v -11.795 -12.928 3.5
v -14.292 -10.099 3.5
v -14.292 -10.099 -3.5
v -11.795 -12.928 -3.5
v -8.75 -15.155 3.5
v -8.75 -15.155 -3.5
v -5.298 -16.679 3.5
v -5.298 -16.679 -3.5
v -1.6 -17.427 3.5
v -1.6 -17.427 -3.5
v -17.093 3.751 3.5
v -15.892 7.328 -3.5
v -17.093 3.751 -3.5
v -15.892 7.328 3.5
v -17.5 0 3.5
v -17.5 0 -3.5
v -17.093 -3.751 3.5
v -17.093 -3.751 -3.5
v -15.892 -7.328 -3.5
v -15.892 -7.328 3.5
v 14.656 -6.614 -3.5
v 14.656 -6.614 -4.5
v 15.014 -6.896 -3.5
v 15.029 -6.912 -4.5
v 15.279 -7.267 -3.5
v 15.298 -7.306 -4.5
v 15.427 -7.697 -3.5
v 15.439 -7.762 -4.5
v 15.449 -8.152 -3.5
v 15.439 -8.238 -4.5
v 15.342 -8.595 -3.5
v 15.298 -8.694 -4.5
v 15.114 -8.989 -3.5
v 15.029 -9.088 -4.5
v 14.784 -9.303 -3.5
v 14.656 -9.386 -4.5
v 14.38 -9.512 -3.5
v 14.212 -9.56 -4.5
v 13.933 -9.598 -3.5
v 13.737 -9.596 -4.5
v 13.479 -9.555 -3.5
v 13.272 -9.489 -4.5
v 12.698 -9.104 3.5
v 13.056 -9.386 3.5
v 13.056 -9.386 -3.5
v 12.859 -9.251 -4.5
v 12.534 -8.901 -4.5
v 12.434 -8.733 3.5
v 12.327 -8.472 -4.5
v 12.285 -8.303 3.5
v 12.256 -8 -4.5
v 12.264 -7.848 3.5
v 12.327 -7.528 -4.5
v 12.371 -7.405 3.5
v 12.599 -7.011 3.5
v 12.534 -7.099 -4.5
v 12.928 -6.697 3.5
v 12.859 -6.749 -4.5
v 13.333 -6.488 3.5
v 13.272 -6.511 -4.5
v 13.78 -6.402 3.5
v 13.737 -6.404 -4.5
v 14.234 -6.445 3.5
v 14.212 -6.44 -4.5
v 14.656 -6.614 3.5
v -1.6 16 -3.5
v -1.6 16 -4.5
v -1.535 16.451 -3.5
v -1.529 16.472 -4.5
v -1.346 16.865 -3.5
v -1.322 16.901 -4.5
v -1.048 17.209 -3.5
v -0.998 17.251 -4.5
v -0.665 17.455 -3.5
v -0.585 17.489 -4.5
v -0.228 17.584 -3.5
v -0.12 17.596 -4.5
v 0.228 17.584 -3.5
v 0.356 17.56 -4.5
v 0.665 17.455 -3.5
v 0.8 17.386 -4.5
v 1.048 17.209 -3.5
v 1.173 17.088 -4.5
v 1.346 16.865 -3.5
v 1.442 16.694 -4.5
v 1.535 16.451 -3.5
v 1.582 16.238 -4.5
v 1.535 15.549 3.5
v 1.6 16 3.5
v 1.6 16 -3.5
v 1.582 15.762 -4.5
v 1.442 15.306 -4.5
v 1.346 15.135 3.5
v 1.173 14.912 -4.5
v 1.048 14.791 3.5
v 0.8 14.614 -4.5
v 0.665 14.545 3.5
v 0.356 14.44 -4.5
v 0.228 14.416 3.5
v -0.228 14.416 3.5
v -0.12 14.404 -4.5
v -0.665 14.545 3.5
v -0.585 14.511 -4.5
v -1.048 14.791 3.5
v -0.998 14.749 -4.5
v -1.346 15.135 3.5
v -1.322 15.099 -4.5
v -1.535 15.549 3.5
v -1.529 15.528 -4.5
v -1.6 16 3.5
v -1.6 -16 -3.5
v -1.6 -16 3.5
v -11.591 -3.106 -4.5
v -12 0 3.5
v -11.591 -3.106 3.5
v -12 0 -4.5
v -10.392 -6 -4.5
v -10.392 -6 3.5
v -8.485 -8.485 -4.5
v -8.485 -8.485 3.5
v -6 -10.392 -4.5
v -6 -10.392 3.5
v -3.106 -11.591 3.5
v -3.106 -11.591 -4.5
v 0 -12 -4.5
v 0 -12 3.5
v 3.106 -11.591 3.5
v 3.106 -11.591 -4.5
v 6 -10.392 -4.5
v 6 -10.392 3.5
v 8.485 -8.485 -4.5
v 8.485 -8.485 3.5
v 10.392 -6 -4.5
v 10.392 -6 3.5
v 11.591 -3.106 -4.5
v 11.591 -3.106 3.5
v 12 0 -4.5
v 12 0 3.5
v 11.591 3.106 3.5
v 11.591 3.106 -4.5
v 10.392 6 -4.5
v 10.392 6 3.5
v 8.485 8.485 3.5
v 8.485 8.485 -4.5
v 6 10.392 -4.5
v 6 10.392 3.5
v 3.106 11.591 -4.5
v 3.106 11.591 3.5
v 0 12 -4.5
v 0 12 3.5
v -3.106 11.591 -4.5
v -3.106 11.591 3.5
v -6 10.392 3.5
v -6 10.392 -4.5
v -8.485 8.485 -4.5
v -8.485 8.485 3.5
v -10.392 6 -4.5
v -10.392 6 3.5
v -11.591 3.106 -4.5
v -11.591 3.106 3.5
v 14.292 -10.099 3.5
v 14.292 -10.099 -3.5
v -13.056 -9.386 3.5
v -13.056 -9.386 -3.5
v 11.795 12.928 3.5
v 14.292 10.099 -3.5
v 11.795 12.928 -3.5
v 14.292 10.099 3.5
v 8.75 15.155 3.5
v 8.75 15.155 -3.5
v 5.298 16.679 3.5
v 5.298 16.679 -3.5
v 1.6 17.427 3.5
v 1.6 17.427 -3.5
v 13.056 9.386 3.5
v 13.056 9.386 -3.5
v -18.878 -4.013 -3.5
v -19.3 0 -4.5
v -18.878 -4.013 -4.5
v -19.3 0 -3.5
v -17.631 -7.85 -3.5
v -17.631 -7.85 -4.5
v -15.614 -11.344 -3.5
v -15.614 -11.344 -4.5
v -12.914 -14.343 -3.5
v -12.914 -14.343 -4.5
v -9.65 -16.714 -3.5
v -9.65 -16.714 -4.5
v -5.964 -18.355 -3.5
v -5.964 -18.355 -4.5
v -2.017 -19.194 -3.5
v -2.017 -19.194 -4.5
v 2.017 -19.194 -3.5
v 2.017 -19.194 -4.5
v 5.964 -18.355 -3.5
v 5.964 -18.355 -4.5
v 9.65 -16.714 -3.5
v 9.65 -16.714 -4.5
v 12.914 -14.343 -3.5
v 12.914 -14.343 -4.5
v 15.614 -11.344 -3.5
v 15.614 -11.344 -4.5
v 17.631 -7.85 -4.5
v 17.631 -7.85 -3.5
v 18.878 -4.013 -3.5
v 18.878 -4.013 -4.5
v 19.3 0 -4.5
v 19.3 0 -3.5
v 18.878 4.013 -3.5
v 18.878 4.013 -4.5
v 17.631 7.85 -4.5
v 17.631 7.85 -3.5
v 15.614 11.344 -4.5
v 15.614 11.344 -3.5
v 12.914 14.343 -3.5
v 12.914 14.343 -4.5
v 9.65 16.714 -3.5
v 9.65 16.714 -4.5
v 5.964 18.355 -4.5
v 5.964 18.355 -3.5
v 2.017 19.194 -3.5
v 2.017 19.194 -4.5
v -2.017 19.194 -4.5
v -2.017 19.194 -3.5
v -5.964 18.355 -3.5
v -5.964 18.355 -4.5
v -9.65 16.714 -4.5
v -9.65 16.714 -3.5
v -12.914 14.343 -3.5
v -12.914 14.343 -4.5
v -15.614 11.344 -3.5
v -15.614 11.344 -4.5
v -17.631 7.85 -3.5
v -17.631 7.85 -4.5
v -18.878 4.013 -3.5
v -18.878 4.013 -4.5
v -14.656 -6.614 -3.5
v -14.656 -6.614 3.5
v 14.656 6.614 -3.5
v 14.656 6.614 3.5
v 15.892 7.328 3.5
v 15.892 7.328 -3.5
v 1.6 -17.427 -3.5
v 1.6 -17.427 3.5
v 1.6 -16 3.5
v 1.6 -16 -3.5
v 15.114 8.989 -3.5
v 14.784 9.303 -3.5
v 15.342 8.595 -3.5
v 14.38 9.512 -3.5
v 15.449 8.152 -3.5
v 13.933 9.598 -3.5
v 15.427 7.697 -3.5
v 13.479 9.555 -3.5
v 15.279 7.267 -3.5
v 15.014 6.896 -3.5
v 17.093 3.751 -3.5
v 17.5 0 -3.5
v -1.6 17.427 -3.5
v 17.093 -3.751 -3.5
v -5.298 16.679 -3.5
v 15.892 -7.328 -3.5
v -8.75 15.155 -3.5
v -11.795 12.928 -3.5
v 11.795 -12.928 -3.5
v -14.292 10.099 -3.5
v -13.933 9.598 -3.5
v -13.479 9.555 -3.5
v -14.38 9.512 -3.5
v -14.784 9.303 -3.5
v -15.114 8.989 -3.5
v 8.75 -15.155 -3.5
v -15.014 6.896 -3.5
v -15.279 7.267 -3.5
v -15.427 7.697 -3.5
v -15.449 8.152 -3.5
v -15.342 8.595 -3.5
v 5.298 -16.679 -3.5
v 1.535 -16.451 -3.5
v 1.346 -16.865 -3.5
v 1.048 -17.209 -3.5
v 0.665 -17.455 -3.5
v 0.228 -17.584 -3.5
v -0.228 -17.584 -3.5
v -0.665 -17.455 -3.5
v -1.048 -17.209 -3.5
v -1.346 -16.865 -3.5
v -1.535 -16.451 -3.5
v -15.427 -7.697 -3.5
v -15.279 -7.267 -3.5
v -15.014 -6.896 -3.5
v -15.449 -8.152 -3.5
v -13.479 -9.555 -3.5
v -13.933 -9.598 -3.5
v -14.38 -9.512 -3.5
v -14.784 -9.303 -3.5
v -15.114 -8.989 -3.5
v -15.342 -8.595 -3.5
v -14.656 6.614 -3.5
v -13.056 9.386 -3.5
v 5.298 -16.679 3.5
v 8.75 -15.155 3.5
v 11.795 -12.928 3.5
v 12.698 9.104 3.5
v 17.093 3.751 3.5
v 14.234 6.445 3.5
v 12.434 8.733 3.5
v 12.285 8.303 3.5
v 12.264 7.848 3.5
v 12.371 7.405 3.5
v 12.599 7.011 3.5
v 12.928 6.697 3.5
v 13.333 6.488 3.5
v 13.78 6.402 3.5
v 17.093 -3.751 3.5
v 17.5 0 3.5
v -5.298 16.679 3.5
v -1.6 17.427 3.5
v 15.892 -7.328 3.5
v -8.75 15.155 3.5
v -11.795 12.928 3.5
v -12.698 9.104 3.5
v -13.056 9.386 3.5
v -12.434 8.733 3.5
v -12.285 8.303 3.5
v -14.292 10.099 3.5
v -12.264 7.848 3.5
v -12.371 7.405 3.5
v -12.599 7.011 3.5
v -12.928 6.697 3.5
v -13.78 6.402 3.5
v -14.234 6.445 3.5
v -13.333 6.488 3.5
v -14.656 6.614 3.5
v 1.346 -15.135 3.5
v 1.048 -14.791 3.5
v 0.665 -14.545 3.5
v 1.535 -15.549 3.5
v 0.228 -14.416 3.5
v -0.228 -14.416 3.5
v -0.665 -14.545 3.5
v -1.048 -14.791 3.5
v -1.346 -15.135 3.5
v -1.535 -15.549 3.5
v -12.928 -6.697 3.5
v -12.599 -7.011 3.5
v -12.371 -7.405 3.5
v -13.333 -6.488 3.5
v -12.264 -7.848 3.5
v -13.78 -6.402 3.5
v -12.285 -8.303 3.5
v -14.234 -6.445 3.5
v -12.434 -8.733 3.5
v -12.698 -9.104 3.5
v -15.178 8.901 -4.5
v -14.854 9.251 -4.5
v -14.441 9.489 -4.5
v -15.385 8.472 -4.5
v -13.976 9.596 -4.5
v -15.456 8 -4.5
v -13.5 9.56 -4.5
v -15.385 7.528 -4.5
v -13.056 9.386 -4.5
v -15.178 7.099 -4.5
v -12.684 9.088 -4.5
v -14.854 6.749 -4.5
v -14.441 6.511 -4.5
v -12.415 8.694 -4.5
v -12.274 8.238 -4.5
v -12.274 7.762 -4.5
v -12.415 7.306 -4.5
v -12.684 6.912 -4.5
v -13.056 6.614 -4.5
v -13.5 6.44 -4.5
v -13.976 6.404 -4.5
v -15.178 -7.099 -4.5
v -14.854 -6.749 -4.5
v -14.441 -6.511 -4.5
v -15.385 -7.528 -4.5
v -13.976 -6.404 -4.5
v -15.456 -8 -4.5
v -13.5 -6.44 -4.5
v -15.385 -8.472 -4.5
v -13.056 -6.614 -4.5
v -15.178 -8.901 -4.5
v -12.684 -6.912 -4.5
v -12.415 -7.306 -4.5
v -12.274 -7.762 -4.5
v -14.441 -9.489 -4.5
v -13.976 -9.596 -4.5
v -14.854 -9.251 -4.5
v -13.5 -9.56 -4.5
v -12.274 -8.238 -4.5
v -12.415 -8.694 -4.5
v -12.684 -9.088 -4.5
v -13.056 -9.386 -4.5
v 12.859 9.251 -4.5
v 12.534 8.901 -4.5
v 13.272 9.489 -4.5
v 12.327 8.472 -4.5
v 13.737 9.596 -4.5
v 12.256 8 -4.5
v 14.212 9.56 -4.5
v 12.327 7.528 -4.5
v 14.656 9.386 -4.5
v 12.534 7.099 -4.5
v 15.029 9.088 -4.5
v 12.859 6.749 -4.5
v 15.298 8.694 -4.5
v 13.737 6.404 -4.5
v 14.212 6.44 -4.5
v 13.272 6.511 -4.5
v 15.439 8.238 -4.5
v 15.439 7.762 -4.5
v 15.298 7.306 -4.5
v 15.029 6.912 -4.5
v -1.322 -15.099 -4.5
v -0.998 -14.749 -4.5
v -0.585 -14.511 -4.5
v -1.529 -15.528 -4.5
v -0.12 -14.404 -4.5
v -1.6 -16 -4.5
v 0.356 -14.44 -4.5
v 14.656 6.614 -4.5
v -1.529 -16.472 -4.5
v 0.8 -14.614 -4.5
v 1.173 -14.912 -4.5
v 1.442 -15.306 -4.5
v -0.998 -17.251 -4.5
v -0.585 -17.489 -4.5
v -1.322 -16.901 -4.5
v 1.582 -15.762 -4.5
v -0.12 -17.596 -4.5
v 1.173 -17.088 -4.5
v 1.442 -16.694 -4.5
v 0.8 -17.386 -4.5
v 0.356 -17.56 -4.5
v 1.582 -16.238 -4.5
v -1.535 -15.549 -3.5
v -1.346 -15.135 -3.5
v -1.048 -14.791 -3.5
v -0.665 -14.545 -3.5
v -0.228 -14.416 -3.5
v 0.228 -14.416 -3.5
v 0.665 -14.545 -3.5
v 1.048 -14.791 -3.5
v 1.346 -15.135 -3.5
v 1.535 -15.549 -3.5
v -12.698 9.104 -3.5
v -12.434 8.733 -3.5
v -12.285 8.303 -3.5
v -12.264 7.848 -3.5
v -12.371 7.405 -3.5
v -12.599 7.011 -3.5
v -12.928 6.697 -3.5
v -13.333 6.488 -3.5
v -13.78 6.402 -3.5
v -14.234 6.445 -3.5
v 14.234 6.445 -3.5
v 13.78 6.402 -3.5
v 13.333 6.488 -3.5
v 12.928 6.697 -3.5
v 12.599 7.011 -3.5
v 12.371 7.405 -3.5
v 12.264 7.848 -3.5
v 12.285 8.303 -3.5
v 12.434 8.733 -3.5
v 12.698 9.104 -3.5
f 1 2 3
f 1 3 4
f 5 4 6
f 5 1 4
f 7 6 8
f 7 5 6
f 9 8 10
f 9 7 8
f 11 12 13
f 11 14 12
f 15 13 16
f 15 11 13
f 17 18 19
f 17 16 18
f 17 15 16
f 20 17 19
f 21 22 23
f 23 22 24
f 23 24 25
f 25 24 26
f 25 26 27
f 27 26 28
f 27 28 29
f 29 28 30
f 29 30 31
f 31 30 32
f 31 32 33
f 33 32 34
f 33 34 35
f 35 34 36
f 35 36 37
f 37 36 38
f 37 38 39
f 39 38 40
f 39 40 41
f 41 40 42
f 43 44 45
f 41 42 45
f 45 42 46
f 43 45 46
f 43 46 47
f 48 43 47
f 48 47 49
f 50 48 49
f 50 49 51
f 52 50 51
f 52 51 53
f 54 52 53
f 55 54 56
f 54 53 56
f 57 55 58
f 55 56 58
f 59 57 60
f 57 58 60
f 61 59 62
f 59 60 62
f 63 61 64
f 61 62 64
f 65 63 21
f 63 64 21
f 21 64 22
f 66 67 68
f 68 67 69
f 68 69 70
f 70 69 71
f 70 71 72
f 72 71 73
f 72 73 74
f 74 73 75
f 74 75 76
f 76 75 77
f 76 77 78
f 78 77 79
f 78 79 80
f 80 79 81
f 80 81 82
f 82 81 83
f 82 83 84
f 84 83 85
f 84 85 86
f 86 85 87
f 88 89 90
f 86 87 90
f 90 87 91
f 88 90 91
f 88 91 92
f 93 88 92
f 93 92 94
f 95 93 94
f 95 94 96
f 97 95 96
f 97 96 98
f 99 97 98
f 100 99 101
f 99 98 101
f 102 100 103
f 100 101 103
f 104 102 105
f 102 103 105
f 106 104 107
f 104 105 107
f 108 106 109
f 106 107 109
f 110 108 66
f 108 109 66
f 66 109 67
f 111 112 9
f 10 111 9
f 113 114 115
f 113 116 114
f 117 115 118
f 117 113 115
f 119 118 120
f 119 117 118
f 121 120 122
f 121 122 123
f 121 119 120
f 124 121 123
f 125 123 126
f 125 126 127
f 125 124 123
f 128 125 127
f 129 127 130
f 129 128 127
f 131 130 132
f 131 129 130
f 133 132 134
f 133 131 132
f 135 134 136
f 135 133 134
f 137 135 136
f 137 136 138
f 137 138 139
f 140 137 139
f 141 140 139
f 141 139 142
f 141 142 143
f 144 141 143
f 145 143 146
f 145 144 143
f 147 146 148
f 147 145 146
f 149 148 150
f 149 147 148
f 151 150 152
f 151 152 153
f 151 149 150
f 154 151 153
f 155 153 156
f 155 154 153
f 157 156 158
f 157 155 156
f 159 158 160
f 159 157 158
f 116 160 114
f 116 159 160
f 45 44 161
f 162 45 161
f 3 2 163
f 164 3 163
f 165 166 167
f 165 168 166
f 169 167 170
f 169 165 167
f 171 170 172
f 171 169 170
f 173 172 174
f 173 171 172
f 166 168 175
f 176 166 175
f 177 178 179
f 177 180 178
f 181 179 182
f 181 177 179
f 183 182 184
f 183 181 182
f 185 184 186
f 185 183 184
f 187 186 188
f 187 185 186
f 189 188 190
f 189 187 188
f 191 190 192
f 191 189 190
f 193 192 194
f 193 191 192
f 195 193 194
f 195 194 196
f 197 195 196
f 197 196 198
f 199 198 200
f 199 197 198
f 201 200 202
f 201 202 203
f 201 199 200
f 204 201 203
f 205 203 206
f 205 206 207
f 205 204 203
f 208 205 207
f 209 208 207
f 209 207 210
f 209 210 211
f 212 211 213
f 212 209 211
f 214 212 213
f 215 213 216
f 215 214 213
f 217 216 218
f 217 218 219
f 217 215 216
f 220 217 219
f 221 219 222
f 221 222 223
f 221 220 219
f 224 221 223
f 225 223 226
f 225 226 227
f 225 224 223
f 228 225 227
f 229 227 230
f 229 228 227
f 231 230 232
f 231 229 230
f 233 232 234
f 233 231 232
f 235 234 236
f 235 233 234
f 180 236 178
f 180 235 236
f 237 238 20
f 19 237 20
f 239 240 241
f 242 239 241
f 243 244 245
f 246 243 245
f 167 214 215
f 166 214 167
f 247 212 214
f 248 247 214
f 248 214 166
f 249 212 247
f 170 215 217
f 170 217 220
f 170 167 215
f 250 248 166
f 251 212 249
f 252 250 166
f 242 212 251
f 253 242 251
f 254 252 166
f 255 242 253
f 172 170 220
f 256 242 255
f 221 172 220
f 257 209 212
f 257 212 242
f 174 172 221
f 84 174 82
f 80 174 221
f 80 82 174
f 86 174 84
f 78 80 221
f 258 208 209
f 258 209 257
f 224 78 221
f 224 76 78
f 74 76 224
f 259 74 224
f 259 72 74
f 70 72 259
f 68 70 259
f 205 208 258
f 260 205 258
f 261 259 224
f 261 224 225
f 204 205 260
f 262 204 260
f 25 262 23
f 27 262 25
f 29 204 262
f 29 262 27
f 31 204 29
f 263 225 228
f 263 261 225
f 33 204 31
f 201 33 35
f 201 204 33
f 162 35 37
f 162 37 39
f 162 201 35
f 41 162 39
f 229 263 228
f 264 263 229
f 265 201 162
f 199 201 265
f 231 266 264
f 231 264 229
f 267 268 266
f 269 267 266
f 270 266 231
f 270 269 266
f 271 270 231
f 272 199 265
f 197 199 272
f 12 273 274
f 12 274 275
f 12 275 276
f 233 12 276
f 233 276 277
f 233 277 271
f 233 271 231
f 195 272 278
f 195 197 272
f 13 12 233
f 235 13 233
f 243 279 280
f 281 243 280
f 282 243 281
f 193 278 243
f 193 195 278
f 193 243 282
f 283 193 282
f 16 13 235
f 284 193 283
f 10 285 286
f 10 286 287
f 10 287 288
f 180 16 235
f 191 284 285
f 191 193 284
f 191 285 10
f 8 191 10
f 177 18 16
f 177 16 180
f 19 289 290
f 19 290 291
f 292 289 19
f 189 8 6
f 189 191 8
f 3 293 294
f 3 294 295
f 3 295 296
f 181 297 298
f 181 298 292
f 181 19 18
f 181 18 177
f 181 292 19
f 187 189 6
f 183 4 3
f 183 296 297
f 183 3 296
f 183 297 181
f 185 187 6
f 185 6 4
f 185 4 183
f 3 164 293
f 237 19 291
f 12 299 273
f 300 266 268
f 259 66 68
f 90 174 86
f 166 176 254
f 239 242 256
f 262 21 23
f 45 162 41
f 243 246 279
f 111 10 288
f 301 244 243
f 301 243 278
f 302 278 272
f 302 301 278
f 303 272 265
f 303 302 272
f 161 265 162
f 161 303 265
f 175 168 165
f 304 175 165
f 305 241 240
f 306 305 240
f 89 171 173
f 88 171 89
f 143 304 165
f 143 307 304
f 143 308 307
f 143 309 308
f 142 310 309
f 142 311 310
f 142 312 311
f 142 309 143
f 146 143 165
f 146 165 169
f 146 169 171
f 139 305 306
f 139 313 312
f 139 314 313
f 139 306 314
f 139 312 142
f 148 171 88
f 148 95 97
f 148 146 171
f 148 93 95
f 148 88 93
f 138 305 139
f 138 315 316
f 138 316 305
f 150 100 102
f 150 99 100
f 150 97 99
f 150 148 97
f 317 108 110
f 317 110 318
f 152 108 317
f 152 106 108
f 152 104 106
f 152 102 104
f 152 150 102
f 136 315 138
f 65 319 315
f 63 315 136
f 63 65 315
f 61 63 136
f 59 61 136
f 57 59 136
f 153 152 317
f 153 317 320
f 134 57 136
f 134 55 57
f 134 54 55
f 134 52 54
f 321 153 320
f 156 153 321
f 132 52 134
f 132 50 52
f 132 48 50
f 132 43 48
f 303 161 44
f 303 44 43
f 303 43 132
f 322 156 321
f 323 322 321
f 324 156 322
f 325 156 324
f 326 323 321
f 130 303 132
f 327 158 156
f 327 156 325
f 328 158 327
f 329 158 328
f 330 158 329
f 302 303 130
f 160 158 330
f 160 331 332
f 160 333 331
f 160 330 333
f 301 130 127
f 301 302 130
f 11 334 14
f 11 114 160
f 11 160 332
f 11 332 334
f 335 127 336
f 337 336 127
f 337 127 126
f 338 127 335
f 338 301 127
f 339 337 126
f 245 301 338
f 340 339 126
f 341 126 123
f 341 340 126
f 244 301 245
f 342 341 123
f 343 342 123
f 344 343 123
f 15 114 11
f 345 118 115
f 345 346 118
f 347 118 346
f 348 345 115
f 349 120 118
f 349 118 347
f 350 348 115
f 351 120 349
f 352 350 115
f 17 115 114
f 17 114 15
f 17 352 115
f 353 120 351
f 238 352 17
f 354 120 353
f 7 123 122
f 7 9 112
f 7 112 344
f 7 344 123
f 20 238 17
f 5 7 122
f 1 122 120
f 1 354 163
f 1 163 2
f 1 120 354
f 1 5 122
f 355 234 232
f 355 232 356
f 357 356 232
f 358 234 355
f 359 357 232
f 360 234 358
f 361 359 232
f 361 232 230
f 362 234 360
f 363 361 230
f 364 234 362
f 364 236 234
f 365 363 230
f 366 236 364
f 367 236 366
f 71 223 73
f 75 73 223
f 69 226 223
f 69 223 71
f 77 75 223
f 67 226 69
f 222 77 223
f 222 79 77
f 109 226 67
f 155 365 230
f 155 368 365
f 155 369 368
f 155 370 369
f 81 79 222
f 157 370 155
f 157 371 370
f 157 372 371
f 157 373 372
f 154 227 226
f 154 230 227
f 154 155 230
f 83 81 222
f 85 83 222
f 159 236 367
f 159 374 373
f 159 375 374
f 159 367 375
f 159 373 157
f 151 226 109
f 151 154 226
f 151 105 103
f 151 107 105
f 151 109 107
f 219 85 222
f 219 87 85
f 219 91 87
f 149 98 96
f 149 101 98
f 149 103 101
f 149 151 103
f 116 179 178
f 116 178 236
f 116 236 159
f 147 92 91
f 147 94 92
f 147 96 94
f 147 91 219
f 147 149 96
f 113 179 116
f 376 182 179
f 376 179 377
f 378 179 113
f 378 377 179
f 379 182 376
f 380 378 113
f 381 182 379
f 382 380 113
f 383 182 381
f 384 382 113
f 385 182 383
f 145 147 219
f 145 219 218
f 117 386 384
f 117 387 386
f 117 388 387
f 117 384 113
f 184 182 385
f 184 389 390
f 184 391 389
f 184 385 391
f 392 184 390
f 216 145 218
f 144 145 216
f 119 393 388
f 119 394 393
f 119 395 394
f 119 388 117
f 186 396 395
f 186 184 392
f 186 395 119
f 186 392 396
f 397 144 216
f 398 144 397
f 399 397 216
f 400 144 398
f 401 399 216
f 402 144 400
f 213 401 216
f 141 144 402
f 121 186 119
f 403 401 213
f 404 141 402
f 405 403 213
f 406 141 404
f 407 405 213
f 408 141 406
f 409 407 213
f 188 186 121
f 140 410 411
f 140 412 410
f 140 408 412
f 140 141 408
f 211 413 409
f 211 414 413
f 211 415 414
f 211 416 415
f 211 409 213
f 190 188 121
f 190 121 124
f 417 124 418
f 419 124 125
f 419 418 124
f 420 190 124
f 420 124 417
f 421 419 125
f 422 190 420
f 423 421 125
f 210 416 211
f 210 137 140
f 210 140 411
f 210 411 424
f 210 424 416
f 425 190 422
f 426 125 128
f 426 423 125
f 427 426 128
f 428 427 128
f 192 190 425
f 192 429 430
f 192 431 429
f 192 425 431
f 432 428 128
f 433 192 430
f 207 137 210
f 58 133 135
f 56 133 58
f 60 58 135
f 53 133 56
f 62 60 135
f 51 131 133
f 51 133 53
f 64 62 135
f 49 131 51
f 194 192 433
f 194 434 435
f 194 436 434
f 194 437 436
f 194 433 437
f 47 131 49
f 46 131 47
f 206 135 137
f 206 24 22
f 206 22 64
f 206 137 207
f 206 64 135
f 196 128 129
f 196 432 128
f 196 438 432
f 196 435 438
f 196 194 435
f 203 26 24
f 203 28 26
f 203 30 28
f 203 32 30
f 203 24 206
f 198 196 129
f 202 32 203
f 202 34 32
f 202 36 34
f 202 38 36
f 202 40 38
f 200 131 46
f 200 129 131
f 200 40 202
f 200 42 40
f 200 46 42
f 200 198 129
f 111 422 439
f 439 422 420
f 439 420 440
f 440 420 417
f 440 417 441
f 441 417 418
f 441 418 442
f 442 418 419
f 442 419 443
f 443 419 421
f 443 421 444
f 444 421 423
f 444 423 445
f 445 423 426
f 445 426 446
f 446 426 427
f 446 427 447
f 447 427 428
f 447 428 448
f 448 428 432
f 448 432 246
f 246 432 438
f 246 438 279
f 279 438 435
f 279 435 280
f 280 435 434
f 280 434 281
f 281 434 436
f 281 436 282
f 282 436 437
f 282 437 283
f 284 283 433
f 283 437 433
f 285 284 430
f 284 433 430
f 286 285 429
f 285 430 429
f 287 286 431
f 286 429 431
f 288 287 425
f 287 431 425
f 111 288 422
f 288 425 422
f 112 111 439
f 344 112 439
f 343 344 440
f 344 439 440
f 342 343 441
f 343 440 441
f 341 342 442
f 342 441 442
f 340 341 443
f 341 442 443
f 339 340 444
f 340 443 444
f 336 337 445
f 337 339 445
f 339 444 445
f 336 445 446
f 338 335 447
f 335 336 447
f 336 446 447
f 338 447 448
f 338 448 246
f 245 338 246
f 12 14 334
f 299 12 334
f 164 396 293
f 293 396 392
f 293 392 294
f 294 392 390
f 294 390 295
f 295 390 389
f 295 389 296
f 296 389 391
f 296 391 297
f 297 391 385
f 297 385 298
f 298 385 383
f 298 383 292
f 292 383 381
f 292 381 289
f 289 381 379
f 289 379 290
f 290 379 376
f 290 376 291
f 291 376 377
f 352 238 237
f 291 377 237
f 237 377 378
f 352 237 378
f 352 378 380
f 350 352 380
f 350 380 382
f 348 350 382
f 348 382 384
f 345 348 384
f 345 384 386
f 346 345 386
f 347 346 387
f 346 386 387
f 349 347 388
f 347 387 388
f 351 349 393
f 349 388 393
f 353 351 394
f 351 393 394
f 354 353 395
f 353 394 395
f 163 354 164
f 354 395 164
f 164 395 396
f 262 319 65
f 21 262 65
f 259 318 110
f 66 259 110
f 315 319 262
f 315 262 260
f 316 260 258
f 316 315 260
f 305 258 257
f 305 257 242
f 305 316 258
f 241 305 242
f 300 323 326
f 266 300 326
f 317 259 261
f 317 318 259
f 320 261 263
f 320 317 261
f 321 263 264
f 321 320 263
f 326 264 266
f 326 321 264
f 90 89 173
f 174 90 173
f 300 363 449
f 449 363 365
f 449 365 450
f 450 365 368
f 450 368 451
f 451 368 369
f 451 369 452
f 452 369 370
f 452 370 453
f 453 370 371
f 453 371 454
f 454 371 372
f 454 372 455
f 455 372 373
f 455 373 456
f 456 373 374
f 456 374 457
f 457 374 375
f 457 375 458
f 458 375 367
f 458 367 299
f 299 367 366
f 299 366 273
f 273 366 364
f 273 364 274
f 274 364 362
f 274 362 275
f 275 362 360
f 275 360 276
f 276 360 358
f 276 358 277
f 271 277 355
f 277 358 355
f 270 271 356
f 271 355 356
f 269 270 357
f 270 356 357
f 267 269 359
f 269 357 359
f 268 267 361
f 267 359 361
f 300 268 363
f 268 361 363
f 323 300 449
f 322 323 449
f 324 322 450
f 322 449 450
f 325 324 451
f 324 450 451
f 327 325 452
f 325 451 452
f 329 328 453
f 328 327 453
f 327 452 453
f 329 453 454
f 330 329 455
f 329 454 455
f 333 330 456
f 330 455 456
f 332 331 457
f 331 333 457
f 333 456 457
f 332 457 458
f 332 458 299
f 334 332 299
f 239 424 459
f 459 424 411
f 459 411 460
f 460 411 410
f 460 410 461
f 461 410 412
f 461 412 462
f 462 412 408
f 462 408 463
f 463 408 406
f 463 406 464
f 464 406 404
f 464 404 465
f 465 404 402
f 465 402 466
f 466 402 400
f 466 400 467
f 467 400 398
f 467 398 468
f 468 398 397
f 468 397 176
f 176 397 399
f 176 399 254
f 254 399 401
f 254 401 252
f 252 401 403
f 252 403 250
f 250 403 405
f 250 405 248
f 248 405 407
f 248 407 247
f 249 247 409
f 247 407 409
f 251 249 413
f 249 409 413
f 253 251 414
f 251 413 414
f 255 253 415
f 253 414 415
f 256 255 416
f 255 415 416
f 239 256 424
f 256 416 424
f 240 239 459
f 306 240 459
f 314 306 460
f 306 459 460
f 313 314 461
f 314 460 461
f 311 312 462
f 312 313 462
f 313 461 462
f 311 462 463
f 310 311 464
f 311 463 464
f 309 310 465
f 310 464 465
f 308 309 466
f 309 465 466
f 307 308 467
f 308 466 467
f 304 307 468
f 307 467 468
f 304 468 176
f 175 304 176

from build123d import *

# Parameters (mm, degrees)
CORTAR_EXTRUIR1_DEPTH = 7
CORTAR_EXTRUIR2_REACH = 30.443
CROQUIS5_R            = 1.6


with BuildPart() as part:
    # Croquis1 → Revolución1 (revolve)
    with BuildSketch(Plane(origin=(0, 0, 0), x_dir=(1, 0, 0), z_dir=(0, 1, 0))):
        Polygon((-12, 4.5), (-19.3, 4.5), (-19.3, 3.5), (-17.5, 3.5), (-17.5, -3.5), (-12, -3.5), align=None)
    revolve(axis=Axis((0, 0, -14.909787419), (0, 0, 1)))

    # Croquis2 → Cortar-Extruir1 (cut)
    with BuildSketch(Plane.XY.offset(3.5)):
        with BuildLine():
            Line((1.6, 16), (1.6, 17.426703647))
            ThreePointArc((1.6, 17.426703647), (0, 17.5), (-1.6, 17.426703647))
            Line((-1.6, 17.426703647), (-1.6, 16))
            ThreePointArc((-1.6, 16), (0, 14.4), (1.6, 16))
        make_face()
        with BuildLine():
            Line((14.656406461, 6.614359354), (15.891968063, 7.327711177))
            ThreePointArc((15.891968063, 7.327711177), (15.155444566, 8.75), (14.291968063, 10.09899247))
            Line((14.291968063, 10.09899247), (13.056406461, 9.385640646))
            ThreePointArc((13.056406461, 9.385640646), (12.470765814, 7.2), (14.656406461, 6.614359354))
        make_face()
        with BuildLine():
            Line((13.056406461, -9.385640646), (14.291968063, -10.09899247))
            ThreePointArc((14.291968063, -10.09899247), (15.155444566, -8.75), (15.891968063, -7.327711177))
            Line((15.891968063, -7.327711177), (14.656406461, -6.614359354))
            ThreePointArc((14.656406461, -6.614359354), (12.470765814, -7.2), (13.056406461, -9.385640646))
        make_face()
        with BuildLine():
            Line((-1.6, -16), (-1.6, -17.426703647))
            ThreePointArc((-1.6, -17.426703647), (0, -17.5), (1.6, -17.426703647))
            Line((1.6, -17.426703647), (1.6, -16))
            ThreePointArc((1.6, -16), (0, -14.4), (-1.6, -16))
        make_face()
        with BuildLine():
            Line((-14.656406461, -6.614359354), (-15.891968063, -7.327711177))
            ThreePointArc((-15.891968063, -7.327711177), (-15.155444566, -8.75), (-14.291968063, -10.09899247))
            Line((-14.291968063, -10.09899247), (-13.056406461, -9.385640646))
            ThreePointArc((-13.056406461, -9.385640646), (-12.470765814, -7.2), (-14.656406461, -6.614359354))
        make_face()
        with BuildLine():
            Line((-13.056406461, 9.385640646), (-14.291968063, 10.09899247))
            ThreePointArc((-14.291968063, 10.09899247), (-15.155444566, 8.75), (-15.891968063, 7.327711177))
            Line((-15.891968063, 7.327711177), (-14.656406461, 6.614359354))
            ThreePointArc((-14.656406461, 6.614359354), (-12.470765814, 7.2), (-13.056406461, 9.385640646))
        make_face()
    extrude(amount=-CORTAR_EXTRUIR1_DEPTH, mode=Mode.SUBTRACT)

    # Croquis5 → Cortar-Extruir2 (cut, up to next)
    with BuildSketch(Plane(origin=(0, 0, -4.5), x_dir=(-1, 0, 0), z_dir=(0, 0, -1)), mode=Mode.PRIVATE) as cortar_extruir2_sk1:
        with Locations((0, 16)):
            Circle(CROQUIS5_R)
    cortar_extruir2_tool1 = extrude(cortar_extruir2_sk1.sketch, amount=-CORTAR_EXTRUIR2_REACH, mode=Mode.PRIVATE) & part.part
    # Croquis5 → Cortar-Extruir2 (cut, up to next)
    with BuildSketch(Plane(origin=(0, 0, -4.5), x_dir=(-1, 0, 0), z_dir=(0, 0, -1)), mode=Mode.PRIVATE) as cortar_extruir2_sk2:
        with Locations(Location((13.856406461, 8, 0), (0, 0, 120))):
            Circle(CROQUIS5_R)
    cortar_extruir2_tool2 = extrude(cortar_extruir2_sk2.sketch, amount=-CORTAR_EXTRUIR2_REACH, mode=Mode.PRIVATE) & part.part
    # Croquis5 → Cortar-Extruir2 (cut, up to next)
    with BuildSketch(Plane(origin=(0, 0, -4.5), x_dir=(-1, 0, 0), z_dir=(0, 0, -1)), mode=Mode.PRIVATE) as cortar_extruir2_sk3:
        with Locations(Location((13.856406461, -8, 0), (0, 0, 240))):
            Circle(CROQUIS5_R)
    cortar_extruir2_tool3 = extrude(cortar_extruir2_sk3.sketch, amount=-CORTAR_EXTRUIR2_REACH, mode=Mode.PRIVATE) & part.part
    # Croquis5 → Cortar-Extruir2 (cut, up to next)
    with BuildSketch(Plane(origin=(0, 0, -4.5), x_dir=(-1, 0, 0), z_dir=(0, 0, -1)), mode=Mode.PRIVATE) as cortar_extruir2_sk4:
        with Locations((0, -16)):
            Circle(CROQUIS5_R)
    cortar_extruir2_tool4 = extrude(cortar_extruir2_sk4.sketch, amount=-CORTAR_EXTRUIR2_REACH, mode=Mode.PRIVATE) & part.part
    # Croquis5 → Cortar-Extruir2 (cut, up to next)
    with BuildSketch(Plane(origin=(0, 0, -4.5), x_dir=(-1, 0, 0), z_dir=(0, 0, -1)), mode=Mode.PRIVATE) as cortar_extruir2_sk5:
        with Locations(Location((-13.856406461, -8, 0), (0, 0, 120))):
            Circle(CROQUIS5_R)
    cortar_extruir2_tool5 = extrude(cortar_extruir2_sk5.sketch, amount=-CORTAR_EXTRUIR2_REACH, mode=Mode.PRIVATE) & part.part
    # Croquis5 → Cortar-Extruir2 (cut, up to next)
    with BuildSketch(Plane(origin=(0, 0, -4.5), x_dir=(-1, 0, 0), z_dir=(0, 0, -1)), mode=Mode.PRIVATE) as cortar_extruir2_sk6:
        with Locations(Location((-13.856406461, 8, 0), (0, 0, 240))):
            Circle(CROQUIS5_R)
    cortar_extruir2_tool6 = extrude(cortar_extruir2_sk6.sketch, amount=-CORTAR_EXTRUIR2_REACH, mode=Mode.PRIVATE) & part.part
    add(cortar_extruir2_tool1.solids().sort_by_distance((0, 16, -4.5))[0], mode=Mode.SUBTRACT)
    add(cortar_extruir2_tool2.solids().sort_by_distance((-13.856406, 8, -4.5))[0], mode=Mode.SUBTRACT)
    add(cortar_extruir2_tool3.solids().sort_by_distance((-13.856406, -8, -4.5))[0], mode=Mode.SUBTRACT)
    add(cortar_extruir2_tool4.solids().sort_by_distance((0, -16, -4.5))[0], mode=Mode.SUBTRACT)
    add(cortar_extruir2_tool5.solids().sort_by_distance((13.856406, -8, -4.5))[0], mode=Mode.SUBTRACT)
    add(cortar_extruir2_tool6.solids().sort_by_distance((13.856406, 8, -4.5))[0], mode=Mode.SUBTRACT)


solid = part.part
